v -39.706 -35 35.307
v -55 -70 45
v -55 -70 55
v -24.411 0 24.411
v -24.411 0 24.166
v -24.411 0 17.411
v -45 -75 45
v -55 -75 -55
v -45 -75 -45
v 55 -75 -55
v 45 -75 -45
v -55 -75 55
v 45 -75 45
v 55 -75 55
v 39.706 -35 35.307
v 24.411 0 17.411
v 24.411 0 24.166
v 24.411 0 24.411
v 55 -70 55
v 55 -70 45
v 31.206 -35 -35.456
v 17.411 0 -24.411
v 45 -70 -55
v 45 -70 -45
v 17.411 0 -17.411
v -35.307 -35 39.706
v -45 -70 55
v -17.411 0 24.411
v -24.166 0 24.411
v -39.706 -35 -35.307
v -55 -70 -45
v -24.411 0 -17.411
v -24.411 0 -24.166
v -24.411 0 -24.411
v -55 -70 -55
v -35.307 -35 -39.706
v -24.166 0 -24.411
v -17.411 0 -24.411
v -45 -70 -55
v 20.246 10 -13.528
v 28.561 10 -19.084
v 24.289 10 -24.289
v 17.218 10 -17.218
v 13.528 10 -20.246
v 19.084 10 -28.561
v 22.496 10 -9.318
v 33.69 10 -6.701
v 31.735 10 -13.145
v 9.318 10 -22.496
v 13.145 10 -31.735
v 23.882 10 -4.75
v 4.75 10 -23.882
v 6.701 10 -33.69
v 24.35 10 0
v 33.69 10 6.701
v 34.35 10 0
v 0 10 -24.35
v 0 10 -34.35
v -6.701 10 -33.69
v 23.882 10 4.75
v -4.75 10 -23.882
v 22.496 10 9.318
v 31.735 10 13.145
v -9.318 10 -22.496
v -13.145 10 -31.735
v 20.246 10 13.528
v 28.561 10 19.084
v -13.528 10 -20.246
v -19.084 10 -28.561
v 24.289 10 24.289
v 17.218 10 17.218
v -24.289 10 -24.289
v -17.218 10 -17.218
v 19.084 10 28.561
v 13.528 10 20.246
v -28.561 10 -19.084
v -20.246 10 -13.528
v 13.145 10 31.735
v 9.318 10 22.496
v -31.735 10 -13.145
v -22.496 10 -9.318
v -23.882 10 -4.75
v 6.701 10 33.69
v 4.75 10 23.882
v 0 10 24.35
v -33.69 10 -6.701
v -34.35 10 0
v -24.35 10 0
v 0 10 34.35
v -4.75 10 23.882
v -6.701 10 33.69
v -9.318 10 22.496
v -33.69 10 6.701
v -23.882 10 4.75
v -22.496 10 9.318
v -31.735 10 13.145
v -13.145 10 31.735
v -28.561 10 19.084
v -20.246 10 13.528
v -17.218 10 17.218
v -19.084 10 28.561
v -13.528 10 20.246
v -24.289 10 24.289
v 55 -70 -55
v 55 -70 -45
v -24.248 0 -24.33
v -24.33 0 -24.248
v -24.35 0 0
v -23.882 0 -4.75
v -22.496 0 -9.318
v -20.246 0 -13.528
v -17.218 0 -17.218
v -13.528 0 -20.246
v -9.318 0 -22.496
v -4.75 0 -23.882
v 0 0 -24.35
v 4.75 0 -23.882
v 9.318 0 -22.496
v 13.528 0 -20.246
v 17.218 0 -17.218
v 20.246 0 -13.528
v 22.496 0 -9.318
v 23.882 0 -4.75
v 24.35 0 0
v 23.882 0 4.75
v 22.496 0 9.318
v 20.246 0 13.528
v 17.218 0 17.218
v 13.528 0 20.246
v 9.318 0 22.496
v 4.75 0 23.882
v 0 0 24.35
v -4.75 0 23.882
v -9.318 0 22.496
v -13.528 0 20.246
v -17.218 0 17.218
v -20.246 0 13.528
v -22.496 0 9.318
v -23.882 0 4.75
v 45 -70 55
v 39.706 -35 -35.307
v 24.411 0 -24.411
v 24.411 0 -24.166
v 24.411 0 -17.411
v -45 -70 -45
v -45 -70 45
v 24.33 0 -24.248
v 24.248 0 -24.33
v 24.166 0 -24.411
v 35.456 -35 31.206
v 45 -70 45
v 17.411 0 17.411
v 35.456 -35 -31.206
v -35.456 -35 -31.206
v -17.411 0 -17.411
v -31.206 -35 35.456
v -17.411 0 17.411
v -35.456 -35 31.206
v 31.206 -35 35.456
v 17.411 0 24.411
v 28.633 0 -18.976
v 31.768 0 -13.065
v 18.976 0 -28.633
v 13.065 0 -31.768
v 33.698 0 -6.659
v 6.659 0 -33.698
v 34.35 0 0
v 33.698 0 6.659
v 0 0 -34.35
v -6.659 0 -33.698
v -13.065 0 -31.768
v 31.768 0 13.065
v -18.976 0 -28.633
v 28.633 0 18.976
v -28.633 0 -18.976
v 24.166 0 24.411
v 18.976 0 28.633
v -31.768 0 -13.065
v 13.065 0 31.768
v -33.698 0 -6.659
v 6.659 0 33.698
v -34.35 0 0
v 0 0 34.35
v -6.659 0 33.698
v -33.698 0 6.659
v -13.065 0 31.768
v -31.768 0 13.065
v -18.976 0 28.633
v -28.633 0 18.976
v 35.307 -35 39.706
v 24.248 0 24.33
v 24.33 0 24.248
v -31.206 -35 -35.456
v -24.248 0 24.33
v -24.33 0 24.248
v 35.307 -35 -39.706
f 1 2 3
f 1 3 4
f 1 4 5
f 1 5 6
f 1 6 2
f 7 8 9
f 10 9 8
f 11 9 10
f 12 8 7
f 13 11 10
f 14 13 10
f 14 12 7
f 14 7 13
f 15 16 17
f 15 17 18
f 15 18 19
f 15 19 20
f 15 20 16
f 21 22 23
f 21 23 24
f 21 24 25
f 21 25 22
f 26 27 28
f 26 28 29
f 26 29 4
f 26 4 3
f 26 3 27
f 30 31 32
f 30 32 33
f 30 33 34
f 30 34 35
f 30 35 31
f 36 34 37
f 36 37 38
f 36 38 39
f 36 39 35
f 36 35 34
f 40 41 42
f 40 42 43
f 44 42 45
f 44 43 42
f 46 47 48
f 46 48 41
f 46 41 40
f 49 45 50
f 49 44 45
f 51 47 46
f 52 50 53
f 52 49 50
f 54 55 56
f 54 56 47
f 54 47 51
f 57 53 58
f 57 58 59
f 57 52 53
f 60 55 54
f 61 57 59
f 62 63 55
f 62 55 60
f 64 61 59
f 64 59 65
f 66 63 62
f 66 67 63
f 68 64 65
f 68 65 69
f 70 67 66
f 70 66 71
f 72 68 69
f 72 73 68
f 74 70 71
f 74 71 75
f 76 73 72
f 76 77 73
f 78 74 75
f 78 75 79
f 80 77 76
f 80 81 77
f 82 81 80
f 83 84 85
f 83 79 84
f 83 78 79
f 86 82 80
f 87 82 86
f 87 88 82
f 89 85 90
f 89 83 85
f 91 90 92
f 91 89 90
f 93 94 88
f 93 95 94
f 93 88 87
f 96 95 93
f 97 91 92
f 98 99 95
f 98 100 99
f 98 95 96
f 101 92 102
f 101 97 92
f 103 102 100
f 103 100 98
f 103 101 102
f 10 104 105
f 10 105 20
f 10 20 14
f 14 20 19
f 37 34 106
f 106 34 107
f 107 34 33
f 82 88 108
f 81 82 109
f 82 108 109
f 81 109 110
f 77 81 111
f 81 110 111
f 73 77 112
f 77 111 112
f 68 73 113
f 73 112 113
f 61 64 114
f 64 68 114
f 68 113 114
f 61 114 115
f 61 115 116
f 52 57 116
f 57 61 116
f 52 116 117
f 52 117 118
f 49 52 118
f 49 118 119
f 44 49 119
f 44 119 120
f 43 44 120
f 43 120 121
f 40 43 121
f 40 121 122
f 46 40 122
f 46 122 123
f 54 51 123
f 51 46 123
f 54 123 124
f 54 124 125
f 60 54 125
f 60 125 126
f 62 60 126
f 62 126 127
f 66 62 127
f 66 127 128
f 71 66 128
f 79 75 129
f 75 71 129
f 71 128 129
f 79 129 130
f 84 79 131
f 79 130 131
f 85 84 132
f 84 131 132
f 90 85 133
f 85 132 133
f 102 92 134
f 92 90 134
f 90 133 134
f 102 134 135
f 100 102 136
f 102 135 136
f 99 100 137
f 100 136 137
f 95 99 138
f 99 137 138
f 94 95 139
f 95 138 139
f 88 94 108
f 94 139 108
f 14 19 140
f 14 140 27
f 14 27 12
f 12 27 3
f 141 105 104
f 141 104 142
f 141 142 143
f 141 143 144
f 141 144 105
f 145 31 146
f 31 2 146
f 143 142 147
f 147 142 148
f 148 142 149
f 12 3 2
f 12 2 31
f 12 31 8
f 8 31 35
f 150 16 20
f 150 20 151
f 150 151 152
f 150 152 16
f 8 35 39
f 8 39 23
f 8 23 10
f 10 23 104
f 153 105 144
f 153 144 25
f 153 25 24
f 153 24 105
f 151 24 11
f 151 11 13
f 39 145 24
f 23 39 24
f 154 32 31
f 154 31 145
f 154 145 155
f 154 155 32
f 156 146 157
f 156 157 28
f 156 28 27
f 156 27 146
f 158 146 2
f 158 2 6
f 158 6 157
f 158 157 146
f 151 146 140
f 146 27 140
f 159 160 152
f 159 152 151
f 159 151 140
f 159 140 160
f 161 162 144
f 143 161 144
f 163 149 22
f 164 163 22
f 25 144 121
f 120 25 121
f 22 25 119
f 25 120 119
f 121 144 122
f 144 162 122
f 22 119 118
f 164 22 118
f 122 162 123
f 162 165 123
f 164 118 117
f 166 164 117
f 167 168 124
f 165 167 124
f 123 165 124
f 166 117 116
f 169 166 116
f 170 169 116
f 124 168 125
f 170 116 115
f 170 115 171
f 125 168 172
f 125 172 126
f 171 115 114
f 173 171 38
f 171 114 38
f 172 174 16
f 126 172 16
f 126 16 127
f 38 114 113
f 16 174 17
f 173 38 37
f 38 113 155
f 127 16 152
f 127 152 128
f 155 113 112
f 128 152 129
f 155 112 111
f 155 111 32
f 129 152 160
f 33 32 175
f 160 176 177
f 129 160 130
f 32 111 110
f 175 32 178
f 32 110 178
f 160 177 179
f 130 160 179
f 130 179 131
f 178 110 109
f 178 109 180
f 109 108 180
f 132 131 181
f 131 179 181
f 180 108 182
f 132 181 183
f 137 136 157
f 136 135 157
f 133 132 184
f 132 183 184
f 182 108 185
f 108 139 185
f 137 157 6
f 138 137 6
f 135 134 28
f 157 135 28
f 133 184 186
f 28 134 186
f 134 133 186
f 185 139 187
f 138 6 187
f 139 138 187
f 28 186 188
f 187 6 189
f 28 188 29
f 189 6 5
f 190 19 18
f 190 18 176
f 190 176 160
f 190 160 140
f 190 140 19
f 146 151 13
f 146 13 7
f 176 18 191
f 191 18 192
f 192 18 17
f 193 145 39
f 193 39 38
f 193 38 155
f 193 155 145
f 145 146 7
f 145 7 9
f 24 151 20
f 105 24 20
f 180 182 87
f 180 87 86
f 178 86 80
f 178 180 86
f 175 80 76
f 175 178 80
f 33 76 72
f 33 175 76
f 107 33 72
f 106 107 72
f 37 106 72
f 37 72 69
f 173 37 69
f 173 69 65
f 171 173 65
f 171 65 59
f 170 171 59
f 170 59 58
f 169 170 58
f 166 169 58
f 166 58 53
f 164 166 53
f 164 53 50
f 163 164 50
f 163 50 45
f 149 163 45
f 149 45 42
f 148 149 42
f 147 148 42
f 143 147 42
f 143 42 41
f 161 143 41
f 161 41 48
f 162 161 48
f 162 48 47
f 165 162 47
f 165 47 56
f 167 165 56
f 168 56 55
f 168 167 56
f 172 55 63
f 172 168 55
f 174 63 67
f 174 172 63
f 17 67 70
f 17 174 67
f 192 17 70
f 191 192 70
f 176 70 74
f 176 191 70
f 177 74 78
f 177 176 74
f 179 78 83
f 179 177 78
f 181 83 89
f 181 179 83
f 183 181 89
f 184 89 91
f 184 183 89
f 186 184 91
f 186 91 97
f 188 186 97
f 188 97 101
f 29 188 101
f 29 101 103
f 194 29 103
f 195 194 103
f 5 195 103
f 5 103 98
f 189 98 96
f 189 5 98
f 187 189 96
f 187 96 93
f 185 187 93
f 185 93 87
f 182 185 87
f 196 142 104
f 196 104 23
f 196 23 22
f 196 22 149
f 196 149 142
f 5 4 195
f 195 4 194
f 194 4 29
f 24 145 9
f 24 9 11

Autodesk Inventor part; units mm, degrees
ref_plane "YZ Plane" through (0, 0, 0) normal (1, 0, 0) x (0, 1, 0)
ref_plane "XZ Plane" through (0, 0, 0) normal (0, 1, 0) x (-1, 0, 0)
sketch "Sketch1" plane through (0, 0, 0) normal (0, 1, 0) x (-1, 0, 0)
  circle A0 centre (0, 0) radius 24.35
  circle A1 centre (0, 0) radius 34.35
  dimension "d0" = 48.7
  dimension "d1" = 10
extrude "Extrusion1" add sketch "Sketch1" along normal blind 10
ref_plane "Work Plane1" through (0, -70, 0) normal (0, -1, 0) x (1, 0, 0)
sketch "Sketch2" plane through (0, -70, 0) normal (0, -1, 0) x (1, 0, 0)
  circle A0 centre (0, 0) radius 34.35 projected
  circle A1 centre (0, 0) radius 24.35 projected
  line L0 (55, 55) -> (-55, 55)
  line L1 (-55, 55) -> (-55, -55)
  line L2 (-55, -55) -> (55, -55)
  line L3 (55, -55) -> (55, 55)
  line L4 (55, 55) -> (-55, -55) construction
  line L5 (-55, 55) -> (55, -55) construction
  line L6 (45, 45) -> (-45, 45)
  line L7 (-45, 45) -> (-45, -45)
  line L8 (-45, -45) -> (45, -45)
  line L9 (45, -45) -> (45, 45)
  line L10 (45, 45) -> (-45, -45) construction
  line L11 (-45, 45) -> (45, -45) construction
  dimension "d7" = 110
  dimension "d8" = 110
  dimension "d9" = 90
  dimension "d10" = 90
extrude "Extrusion2" add sketch "Sketch2" along normal blind 5 contours L3 L2 L1 L0
sketch "Sketch3" plane through (0, -70, 0) normal (0, 1, 0) x (1, 0, 0)
  line L0 (-55, 55) -> (55, 55) projected
  line L1 (45, -45) -> (45, 45) projected
  line L2 (55, 55) -> (45, 55)
  line L3 (45, 55) -> (45, 45)
  line L4 (45, 45) -> (55, 45)
  line L5 (55, 45) -> (55, 55)
  line L6 (-45, 45) -> (-45, -45) projected
  line L7 (-55, 55) -> (-45, 55)
  line L8 (-45, 55) -> (-45, 45)
  line L9 (-45, 45) -> (-55, 45)
  line L10 (-55, 45) -> (-55, 55)
  line L11 (55, -55) -> (-55, -55) projected
  line L12 (-55, -55) -> (-45, -55)
  line L13 (-45, -55) -> (-45, -45)
  line L14 (-45, -45) -> (-55, -45)
  line L15 (-55, -45) -> (-55, -55)
  line L16 (55, -55) -> (45, -55)
  line L17 (45, -55) -> (45, -45)
  line L18 (45, -45) -> (55, -45)
  line L19 (55, -45) -> (55, -55)
  point P0 (0, 0)
sketch "Sketch4" plane through (0, 0, 0) normal (0, -1, 0) x (1, 0, 0)
  line L0 (-55, 55) -> (-55, -55) projected
  line L1 (-55, -55) -> (55, -55) projected
  line L2 (55, -55) -> (55, 55) projected
  line L3 (55, 55) -> (-55, 55) projected
  line L4 (45, 45) -> (45, -45) projected
  line L5 (45, -45) -> (-45, -45) projected
  line L6 (-45, -45) -> (-45, 45) projected
  line L7 (-45, 45) -> (45, 45) projected
  line L8 (55, 55) -> (-55, -55)
  line L9 (-55, 55) -> (55, -55)
  line L10 (55, -55) -> (45, -55)
  line L11 (45, -55) -> (45, -45)
  line L12 (45, -45) -> (55, -45)
  line L13 (55, -45) -> (55, -55)
  line L14 (24.4112, -24.4112) -> (17.4112, -24.4112)
  line L15 (17.4112, -24.4112) -> (17.4112, -17.4112)
  line L16 (17.4112, -17.4112) -> (24.4112, -17.4112)
  line L17 (24.4112, -17.4112) -> (24.4112, -24.4112)
  line L18 (24.4112, 17.4112) -> (17.4112, 17.4112)
  line L19 (17.4112, 17.4112) -> (17.4112, 24.4112)
  line L20 (17.4112, 24.4112) -> (24.4112, 24.4112)
  line L21 (24.4112, 24.4112) -> (24.4112, 17.4112)
  line L22 (-17.2122, 17.4112) -> (-24.2122, 17.4112)
  line L23 (-24.2122, 17.4112) -> (-24.2122, 24.4112)
  line L24 (-24.2122, 24.4112) -> (-17.2122, 24.4112)
  line L25 (-17.2122, 24.4112) -> (-17.2122, 17.4112)
  line L26 (-17.4112, -24.4112) -> (-24.4112, -24.4112)
  line L27 (-24.4112, -24.4112) -> (-24.4112, -17.4112)
  line L28 (-24.4112, -17.4112) -> (-17.4112, -17.4112)
  line L29 (-17.4112, -17.4112) -> (-17.4112, -24.4112)
  point P0 (0, 0)
  dimension "d13" = 7
  dimension "d14" = 7
  dimension "d15" = 7
  dimension "d16" = 7
  dimension "d17" = 7
  dimension "d18" = 7
  dimension "d19" = 7
  dimension "d20" = 7
loft "Loft1" add profiles "Sketch4", "Sketch3" contours L27 L28 L8 | L8 L29 L26 / L0 L8 L9 L10
pattern_circular "Circular Pattern1" count 4 over 360 about axis through (0, 0, 0) along (0, 1, 0) of "Loft1"
equation "\"BendRadius\" = Thickness"
equation "\"BendReliefWidth\" = Thickness"
equation "\"BendReliefDepth\" = 0.5 * Thickness"
equation "\"CornerReliefSize\" = 4 * Thickness"
equation "\"MinimumRemnant\" = 2 * Thickness"
equation "\"TransitionRadius\" = BendRadius"
equation "\"JacobiRadiusSize\" = BendRadius"
equation "\"GapSize\" = Thickness"
equation "\"Thickness\" = 0.5"
properties part number "klec_1"
